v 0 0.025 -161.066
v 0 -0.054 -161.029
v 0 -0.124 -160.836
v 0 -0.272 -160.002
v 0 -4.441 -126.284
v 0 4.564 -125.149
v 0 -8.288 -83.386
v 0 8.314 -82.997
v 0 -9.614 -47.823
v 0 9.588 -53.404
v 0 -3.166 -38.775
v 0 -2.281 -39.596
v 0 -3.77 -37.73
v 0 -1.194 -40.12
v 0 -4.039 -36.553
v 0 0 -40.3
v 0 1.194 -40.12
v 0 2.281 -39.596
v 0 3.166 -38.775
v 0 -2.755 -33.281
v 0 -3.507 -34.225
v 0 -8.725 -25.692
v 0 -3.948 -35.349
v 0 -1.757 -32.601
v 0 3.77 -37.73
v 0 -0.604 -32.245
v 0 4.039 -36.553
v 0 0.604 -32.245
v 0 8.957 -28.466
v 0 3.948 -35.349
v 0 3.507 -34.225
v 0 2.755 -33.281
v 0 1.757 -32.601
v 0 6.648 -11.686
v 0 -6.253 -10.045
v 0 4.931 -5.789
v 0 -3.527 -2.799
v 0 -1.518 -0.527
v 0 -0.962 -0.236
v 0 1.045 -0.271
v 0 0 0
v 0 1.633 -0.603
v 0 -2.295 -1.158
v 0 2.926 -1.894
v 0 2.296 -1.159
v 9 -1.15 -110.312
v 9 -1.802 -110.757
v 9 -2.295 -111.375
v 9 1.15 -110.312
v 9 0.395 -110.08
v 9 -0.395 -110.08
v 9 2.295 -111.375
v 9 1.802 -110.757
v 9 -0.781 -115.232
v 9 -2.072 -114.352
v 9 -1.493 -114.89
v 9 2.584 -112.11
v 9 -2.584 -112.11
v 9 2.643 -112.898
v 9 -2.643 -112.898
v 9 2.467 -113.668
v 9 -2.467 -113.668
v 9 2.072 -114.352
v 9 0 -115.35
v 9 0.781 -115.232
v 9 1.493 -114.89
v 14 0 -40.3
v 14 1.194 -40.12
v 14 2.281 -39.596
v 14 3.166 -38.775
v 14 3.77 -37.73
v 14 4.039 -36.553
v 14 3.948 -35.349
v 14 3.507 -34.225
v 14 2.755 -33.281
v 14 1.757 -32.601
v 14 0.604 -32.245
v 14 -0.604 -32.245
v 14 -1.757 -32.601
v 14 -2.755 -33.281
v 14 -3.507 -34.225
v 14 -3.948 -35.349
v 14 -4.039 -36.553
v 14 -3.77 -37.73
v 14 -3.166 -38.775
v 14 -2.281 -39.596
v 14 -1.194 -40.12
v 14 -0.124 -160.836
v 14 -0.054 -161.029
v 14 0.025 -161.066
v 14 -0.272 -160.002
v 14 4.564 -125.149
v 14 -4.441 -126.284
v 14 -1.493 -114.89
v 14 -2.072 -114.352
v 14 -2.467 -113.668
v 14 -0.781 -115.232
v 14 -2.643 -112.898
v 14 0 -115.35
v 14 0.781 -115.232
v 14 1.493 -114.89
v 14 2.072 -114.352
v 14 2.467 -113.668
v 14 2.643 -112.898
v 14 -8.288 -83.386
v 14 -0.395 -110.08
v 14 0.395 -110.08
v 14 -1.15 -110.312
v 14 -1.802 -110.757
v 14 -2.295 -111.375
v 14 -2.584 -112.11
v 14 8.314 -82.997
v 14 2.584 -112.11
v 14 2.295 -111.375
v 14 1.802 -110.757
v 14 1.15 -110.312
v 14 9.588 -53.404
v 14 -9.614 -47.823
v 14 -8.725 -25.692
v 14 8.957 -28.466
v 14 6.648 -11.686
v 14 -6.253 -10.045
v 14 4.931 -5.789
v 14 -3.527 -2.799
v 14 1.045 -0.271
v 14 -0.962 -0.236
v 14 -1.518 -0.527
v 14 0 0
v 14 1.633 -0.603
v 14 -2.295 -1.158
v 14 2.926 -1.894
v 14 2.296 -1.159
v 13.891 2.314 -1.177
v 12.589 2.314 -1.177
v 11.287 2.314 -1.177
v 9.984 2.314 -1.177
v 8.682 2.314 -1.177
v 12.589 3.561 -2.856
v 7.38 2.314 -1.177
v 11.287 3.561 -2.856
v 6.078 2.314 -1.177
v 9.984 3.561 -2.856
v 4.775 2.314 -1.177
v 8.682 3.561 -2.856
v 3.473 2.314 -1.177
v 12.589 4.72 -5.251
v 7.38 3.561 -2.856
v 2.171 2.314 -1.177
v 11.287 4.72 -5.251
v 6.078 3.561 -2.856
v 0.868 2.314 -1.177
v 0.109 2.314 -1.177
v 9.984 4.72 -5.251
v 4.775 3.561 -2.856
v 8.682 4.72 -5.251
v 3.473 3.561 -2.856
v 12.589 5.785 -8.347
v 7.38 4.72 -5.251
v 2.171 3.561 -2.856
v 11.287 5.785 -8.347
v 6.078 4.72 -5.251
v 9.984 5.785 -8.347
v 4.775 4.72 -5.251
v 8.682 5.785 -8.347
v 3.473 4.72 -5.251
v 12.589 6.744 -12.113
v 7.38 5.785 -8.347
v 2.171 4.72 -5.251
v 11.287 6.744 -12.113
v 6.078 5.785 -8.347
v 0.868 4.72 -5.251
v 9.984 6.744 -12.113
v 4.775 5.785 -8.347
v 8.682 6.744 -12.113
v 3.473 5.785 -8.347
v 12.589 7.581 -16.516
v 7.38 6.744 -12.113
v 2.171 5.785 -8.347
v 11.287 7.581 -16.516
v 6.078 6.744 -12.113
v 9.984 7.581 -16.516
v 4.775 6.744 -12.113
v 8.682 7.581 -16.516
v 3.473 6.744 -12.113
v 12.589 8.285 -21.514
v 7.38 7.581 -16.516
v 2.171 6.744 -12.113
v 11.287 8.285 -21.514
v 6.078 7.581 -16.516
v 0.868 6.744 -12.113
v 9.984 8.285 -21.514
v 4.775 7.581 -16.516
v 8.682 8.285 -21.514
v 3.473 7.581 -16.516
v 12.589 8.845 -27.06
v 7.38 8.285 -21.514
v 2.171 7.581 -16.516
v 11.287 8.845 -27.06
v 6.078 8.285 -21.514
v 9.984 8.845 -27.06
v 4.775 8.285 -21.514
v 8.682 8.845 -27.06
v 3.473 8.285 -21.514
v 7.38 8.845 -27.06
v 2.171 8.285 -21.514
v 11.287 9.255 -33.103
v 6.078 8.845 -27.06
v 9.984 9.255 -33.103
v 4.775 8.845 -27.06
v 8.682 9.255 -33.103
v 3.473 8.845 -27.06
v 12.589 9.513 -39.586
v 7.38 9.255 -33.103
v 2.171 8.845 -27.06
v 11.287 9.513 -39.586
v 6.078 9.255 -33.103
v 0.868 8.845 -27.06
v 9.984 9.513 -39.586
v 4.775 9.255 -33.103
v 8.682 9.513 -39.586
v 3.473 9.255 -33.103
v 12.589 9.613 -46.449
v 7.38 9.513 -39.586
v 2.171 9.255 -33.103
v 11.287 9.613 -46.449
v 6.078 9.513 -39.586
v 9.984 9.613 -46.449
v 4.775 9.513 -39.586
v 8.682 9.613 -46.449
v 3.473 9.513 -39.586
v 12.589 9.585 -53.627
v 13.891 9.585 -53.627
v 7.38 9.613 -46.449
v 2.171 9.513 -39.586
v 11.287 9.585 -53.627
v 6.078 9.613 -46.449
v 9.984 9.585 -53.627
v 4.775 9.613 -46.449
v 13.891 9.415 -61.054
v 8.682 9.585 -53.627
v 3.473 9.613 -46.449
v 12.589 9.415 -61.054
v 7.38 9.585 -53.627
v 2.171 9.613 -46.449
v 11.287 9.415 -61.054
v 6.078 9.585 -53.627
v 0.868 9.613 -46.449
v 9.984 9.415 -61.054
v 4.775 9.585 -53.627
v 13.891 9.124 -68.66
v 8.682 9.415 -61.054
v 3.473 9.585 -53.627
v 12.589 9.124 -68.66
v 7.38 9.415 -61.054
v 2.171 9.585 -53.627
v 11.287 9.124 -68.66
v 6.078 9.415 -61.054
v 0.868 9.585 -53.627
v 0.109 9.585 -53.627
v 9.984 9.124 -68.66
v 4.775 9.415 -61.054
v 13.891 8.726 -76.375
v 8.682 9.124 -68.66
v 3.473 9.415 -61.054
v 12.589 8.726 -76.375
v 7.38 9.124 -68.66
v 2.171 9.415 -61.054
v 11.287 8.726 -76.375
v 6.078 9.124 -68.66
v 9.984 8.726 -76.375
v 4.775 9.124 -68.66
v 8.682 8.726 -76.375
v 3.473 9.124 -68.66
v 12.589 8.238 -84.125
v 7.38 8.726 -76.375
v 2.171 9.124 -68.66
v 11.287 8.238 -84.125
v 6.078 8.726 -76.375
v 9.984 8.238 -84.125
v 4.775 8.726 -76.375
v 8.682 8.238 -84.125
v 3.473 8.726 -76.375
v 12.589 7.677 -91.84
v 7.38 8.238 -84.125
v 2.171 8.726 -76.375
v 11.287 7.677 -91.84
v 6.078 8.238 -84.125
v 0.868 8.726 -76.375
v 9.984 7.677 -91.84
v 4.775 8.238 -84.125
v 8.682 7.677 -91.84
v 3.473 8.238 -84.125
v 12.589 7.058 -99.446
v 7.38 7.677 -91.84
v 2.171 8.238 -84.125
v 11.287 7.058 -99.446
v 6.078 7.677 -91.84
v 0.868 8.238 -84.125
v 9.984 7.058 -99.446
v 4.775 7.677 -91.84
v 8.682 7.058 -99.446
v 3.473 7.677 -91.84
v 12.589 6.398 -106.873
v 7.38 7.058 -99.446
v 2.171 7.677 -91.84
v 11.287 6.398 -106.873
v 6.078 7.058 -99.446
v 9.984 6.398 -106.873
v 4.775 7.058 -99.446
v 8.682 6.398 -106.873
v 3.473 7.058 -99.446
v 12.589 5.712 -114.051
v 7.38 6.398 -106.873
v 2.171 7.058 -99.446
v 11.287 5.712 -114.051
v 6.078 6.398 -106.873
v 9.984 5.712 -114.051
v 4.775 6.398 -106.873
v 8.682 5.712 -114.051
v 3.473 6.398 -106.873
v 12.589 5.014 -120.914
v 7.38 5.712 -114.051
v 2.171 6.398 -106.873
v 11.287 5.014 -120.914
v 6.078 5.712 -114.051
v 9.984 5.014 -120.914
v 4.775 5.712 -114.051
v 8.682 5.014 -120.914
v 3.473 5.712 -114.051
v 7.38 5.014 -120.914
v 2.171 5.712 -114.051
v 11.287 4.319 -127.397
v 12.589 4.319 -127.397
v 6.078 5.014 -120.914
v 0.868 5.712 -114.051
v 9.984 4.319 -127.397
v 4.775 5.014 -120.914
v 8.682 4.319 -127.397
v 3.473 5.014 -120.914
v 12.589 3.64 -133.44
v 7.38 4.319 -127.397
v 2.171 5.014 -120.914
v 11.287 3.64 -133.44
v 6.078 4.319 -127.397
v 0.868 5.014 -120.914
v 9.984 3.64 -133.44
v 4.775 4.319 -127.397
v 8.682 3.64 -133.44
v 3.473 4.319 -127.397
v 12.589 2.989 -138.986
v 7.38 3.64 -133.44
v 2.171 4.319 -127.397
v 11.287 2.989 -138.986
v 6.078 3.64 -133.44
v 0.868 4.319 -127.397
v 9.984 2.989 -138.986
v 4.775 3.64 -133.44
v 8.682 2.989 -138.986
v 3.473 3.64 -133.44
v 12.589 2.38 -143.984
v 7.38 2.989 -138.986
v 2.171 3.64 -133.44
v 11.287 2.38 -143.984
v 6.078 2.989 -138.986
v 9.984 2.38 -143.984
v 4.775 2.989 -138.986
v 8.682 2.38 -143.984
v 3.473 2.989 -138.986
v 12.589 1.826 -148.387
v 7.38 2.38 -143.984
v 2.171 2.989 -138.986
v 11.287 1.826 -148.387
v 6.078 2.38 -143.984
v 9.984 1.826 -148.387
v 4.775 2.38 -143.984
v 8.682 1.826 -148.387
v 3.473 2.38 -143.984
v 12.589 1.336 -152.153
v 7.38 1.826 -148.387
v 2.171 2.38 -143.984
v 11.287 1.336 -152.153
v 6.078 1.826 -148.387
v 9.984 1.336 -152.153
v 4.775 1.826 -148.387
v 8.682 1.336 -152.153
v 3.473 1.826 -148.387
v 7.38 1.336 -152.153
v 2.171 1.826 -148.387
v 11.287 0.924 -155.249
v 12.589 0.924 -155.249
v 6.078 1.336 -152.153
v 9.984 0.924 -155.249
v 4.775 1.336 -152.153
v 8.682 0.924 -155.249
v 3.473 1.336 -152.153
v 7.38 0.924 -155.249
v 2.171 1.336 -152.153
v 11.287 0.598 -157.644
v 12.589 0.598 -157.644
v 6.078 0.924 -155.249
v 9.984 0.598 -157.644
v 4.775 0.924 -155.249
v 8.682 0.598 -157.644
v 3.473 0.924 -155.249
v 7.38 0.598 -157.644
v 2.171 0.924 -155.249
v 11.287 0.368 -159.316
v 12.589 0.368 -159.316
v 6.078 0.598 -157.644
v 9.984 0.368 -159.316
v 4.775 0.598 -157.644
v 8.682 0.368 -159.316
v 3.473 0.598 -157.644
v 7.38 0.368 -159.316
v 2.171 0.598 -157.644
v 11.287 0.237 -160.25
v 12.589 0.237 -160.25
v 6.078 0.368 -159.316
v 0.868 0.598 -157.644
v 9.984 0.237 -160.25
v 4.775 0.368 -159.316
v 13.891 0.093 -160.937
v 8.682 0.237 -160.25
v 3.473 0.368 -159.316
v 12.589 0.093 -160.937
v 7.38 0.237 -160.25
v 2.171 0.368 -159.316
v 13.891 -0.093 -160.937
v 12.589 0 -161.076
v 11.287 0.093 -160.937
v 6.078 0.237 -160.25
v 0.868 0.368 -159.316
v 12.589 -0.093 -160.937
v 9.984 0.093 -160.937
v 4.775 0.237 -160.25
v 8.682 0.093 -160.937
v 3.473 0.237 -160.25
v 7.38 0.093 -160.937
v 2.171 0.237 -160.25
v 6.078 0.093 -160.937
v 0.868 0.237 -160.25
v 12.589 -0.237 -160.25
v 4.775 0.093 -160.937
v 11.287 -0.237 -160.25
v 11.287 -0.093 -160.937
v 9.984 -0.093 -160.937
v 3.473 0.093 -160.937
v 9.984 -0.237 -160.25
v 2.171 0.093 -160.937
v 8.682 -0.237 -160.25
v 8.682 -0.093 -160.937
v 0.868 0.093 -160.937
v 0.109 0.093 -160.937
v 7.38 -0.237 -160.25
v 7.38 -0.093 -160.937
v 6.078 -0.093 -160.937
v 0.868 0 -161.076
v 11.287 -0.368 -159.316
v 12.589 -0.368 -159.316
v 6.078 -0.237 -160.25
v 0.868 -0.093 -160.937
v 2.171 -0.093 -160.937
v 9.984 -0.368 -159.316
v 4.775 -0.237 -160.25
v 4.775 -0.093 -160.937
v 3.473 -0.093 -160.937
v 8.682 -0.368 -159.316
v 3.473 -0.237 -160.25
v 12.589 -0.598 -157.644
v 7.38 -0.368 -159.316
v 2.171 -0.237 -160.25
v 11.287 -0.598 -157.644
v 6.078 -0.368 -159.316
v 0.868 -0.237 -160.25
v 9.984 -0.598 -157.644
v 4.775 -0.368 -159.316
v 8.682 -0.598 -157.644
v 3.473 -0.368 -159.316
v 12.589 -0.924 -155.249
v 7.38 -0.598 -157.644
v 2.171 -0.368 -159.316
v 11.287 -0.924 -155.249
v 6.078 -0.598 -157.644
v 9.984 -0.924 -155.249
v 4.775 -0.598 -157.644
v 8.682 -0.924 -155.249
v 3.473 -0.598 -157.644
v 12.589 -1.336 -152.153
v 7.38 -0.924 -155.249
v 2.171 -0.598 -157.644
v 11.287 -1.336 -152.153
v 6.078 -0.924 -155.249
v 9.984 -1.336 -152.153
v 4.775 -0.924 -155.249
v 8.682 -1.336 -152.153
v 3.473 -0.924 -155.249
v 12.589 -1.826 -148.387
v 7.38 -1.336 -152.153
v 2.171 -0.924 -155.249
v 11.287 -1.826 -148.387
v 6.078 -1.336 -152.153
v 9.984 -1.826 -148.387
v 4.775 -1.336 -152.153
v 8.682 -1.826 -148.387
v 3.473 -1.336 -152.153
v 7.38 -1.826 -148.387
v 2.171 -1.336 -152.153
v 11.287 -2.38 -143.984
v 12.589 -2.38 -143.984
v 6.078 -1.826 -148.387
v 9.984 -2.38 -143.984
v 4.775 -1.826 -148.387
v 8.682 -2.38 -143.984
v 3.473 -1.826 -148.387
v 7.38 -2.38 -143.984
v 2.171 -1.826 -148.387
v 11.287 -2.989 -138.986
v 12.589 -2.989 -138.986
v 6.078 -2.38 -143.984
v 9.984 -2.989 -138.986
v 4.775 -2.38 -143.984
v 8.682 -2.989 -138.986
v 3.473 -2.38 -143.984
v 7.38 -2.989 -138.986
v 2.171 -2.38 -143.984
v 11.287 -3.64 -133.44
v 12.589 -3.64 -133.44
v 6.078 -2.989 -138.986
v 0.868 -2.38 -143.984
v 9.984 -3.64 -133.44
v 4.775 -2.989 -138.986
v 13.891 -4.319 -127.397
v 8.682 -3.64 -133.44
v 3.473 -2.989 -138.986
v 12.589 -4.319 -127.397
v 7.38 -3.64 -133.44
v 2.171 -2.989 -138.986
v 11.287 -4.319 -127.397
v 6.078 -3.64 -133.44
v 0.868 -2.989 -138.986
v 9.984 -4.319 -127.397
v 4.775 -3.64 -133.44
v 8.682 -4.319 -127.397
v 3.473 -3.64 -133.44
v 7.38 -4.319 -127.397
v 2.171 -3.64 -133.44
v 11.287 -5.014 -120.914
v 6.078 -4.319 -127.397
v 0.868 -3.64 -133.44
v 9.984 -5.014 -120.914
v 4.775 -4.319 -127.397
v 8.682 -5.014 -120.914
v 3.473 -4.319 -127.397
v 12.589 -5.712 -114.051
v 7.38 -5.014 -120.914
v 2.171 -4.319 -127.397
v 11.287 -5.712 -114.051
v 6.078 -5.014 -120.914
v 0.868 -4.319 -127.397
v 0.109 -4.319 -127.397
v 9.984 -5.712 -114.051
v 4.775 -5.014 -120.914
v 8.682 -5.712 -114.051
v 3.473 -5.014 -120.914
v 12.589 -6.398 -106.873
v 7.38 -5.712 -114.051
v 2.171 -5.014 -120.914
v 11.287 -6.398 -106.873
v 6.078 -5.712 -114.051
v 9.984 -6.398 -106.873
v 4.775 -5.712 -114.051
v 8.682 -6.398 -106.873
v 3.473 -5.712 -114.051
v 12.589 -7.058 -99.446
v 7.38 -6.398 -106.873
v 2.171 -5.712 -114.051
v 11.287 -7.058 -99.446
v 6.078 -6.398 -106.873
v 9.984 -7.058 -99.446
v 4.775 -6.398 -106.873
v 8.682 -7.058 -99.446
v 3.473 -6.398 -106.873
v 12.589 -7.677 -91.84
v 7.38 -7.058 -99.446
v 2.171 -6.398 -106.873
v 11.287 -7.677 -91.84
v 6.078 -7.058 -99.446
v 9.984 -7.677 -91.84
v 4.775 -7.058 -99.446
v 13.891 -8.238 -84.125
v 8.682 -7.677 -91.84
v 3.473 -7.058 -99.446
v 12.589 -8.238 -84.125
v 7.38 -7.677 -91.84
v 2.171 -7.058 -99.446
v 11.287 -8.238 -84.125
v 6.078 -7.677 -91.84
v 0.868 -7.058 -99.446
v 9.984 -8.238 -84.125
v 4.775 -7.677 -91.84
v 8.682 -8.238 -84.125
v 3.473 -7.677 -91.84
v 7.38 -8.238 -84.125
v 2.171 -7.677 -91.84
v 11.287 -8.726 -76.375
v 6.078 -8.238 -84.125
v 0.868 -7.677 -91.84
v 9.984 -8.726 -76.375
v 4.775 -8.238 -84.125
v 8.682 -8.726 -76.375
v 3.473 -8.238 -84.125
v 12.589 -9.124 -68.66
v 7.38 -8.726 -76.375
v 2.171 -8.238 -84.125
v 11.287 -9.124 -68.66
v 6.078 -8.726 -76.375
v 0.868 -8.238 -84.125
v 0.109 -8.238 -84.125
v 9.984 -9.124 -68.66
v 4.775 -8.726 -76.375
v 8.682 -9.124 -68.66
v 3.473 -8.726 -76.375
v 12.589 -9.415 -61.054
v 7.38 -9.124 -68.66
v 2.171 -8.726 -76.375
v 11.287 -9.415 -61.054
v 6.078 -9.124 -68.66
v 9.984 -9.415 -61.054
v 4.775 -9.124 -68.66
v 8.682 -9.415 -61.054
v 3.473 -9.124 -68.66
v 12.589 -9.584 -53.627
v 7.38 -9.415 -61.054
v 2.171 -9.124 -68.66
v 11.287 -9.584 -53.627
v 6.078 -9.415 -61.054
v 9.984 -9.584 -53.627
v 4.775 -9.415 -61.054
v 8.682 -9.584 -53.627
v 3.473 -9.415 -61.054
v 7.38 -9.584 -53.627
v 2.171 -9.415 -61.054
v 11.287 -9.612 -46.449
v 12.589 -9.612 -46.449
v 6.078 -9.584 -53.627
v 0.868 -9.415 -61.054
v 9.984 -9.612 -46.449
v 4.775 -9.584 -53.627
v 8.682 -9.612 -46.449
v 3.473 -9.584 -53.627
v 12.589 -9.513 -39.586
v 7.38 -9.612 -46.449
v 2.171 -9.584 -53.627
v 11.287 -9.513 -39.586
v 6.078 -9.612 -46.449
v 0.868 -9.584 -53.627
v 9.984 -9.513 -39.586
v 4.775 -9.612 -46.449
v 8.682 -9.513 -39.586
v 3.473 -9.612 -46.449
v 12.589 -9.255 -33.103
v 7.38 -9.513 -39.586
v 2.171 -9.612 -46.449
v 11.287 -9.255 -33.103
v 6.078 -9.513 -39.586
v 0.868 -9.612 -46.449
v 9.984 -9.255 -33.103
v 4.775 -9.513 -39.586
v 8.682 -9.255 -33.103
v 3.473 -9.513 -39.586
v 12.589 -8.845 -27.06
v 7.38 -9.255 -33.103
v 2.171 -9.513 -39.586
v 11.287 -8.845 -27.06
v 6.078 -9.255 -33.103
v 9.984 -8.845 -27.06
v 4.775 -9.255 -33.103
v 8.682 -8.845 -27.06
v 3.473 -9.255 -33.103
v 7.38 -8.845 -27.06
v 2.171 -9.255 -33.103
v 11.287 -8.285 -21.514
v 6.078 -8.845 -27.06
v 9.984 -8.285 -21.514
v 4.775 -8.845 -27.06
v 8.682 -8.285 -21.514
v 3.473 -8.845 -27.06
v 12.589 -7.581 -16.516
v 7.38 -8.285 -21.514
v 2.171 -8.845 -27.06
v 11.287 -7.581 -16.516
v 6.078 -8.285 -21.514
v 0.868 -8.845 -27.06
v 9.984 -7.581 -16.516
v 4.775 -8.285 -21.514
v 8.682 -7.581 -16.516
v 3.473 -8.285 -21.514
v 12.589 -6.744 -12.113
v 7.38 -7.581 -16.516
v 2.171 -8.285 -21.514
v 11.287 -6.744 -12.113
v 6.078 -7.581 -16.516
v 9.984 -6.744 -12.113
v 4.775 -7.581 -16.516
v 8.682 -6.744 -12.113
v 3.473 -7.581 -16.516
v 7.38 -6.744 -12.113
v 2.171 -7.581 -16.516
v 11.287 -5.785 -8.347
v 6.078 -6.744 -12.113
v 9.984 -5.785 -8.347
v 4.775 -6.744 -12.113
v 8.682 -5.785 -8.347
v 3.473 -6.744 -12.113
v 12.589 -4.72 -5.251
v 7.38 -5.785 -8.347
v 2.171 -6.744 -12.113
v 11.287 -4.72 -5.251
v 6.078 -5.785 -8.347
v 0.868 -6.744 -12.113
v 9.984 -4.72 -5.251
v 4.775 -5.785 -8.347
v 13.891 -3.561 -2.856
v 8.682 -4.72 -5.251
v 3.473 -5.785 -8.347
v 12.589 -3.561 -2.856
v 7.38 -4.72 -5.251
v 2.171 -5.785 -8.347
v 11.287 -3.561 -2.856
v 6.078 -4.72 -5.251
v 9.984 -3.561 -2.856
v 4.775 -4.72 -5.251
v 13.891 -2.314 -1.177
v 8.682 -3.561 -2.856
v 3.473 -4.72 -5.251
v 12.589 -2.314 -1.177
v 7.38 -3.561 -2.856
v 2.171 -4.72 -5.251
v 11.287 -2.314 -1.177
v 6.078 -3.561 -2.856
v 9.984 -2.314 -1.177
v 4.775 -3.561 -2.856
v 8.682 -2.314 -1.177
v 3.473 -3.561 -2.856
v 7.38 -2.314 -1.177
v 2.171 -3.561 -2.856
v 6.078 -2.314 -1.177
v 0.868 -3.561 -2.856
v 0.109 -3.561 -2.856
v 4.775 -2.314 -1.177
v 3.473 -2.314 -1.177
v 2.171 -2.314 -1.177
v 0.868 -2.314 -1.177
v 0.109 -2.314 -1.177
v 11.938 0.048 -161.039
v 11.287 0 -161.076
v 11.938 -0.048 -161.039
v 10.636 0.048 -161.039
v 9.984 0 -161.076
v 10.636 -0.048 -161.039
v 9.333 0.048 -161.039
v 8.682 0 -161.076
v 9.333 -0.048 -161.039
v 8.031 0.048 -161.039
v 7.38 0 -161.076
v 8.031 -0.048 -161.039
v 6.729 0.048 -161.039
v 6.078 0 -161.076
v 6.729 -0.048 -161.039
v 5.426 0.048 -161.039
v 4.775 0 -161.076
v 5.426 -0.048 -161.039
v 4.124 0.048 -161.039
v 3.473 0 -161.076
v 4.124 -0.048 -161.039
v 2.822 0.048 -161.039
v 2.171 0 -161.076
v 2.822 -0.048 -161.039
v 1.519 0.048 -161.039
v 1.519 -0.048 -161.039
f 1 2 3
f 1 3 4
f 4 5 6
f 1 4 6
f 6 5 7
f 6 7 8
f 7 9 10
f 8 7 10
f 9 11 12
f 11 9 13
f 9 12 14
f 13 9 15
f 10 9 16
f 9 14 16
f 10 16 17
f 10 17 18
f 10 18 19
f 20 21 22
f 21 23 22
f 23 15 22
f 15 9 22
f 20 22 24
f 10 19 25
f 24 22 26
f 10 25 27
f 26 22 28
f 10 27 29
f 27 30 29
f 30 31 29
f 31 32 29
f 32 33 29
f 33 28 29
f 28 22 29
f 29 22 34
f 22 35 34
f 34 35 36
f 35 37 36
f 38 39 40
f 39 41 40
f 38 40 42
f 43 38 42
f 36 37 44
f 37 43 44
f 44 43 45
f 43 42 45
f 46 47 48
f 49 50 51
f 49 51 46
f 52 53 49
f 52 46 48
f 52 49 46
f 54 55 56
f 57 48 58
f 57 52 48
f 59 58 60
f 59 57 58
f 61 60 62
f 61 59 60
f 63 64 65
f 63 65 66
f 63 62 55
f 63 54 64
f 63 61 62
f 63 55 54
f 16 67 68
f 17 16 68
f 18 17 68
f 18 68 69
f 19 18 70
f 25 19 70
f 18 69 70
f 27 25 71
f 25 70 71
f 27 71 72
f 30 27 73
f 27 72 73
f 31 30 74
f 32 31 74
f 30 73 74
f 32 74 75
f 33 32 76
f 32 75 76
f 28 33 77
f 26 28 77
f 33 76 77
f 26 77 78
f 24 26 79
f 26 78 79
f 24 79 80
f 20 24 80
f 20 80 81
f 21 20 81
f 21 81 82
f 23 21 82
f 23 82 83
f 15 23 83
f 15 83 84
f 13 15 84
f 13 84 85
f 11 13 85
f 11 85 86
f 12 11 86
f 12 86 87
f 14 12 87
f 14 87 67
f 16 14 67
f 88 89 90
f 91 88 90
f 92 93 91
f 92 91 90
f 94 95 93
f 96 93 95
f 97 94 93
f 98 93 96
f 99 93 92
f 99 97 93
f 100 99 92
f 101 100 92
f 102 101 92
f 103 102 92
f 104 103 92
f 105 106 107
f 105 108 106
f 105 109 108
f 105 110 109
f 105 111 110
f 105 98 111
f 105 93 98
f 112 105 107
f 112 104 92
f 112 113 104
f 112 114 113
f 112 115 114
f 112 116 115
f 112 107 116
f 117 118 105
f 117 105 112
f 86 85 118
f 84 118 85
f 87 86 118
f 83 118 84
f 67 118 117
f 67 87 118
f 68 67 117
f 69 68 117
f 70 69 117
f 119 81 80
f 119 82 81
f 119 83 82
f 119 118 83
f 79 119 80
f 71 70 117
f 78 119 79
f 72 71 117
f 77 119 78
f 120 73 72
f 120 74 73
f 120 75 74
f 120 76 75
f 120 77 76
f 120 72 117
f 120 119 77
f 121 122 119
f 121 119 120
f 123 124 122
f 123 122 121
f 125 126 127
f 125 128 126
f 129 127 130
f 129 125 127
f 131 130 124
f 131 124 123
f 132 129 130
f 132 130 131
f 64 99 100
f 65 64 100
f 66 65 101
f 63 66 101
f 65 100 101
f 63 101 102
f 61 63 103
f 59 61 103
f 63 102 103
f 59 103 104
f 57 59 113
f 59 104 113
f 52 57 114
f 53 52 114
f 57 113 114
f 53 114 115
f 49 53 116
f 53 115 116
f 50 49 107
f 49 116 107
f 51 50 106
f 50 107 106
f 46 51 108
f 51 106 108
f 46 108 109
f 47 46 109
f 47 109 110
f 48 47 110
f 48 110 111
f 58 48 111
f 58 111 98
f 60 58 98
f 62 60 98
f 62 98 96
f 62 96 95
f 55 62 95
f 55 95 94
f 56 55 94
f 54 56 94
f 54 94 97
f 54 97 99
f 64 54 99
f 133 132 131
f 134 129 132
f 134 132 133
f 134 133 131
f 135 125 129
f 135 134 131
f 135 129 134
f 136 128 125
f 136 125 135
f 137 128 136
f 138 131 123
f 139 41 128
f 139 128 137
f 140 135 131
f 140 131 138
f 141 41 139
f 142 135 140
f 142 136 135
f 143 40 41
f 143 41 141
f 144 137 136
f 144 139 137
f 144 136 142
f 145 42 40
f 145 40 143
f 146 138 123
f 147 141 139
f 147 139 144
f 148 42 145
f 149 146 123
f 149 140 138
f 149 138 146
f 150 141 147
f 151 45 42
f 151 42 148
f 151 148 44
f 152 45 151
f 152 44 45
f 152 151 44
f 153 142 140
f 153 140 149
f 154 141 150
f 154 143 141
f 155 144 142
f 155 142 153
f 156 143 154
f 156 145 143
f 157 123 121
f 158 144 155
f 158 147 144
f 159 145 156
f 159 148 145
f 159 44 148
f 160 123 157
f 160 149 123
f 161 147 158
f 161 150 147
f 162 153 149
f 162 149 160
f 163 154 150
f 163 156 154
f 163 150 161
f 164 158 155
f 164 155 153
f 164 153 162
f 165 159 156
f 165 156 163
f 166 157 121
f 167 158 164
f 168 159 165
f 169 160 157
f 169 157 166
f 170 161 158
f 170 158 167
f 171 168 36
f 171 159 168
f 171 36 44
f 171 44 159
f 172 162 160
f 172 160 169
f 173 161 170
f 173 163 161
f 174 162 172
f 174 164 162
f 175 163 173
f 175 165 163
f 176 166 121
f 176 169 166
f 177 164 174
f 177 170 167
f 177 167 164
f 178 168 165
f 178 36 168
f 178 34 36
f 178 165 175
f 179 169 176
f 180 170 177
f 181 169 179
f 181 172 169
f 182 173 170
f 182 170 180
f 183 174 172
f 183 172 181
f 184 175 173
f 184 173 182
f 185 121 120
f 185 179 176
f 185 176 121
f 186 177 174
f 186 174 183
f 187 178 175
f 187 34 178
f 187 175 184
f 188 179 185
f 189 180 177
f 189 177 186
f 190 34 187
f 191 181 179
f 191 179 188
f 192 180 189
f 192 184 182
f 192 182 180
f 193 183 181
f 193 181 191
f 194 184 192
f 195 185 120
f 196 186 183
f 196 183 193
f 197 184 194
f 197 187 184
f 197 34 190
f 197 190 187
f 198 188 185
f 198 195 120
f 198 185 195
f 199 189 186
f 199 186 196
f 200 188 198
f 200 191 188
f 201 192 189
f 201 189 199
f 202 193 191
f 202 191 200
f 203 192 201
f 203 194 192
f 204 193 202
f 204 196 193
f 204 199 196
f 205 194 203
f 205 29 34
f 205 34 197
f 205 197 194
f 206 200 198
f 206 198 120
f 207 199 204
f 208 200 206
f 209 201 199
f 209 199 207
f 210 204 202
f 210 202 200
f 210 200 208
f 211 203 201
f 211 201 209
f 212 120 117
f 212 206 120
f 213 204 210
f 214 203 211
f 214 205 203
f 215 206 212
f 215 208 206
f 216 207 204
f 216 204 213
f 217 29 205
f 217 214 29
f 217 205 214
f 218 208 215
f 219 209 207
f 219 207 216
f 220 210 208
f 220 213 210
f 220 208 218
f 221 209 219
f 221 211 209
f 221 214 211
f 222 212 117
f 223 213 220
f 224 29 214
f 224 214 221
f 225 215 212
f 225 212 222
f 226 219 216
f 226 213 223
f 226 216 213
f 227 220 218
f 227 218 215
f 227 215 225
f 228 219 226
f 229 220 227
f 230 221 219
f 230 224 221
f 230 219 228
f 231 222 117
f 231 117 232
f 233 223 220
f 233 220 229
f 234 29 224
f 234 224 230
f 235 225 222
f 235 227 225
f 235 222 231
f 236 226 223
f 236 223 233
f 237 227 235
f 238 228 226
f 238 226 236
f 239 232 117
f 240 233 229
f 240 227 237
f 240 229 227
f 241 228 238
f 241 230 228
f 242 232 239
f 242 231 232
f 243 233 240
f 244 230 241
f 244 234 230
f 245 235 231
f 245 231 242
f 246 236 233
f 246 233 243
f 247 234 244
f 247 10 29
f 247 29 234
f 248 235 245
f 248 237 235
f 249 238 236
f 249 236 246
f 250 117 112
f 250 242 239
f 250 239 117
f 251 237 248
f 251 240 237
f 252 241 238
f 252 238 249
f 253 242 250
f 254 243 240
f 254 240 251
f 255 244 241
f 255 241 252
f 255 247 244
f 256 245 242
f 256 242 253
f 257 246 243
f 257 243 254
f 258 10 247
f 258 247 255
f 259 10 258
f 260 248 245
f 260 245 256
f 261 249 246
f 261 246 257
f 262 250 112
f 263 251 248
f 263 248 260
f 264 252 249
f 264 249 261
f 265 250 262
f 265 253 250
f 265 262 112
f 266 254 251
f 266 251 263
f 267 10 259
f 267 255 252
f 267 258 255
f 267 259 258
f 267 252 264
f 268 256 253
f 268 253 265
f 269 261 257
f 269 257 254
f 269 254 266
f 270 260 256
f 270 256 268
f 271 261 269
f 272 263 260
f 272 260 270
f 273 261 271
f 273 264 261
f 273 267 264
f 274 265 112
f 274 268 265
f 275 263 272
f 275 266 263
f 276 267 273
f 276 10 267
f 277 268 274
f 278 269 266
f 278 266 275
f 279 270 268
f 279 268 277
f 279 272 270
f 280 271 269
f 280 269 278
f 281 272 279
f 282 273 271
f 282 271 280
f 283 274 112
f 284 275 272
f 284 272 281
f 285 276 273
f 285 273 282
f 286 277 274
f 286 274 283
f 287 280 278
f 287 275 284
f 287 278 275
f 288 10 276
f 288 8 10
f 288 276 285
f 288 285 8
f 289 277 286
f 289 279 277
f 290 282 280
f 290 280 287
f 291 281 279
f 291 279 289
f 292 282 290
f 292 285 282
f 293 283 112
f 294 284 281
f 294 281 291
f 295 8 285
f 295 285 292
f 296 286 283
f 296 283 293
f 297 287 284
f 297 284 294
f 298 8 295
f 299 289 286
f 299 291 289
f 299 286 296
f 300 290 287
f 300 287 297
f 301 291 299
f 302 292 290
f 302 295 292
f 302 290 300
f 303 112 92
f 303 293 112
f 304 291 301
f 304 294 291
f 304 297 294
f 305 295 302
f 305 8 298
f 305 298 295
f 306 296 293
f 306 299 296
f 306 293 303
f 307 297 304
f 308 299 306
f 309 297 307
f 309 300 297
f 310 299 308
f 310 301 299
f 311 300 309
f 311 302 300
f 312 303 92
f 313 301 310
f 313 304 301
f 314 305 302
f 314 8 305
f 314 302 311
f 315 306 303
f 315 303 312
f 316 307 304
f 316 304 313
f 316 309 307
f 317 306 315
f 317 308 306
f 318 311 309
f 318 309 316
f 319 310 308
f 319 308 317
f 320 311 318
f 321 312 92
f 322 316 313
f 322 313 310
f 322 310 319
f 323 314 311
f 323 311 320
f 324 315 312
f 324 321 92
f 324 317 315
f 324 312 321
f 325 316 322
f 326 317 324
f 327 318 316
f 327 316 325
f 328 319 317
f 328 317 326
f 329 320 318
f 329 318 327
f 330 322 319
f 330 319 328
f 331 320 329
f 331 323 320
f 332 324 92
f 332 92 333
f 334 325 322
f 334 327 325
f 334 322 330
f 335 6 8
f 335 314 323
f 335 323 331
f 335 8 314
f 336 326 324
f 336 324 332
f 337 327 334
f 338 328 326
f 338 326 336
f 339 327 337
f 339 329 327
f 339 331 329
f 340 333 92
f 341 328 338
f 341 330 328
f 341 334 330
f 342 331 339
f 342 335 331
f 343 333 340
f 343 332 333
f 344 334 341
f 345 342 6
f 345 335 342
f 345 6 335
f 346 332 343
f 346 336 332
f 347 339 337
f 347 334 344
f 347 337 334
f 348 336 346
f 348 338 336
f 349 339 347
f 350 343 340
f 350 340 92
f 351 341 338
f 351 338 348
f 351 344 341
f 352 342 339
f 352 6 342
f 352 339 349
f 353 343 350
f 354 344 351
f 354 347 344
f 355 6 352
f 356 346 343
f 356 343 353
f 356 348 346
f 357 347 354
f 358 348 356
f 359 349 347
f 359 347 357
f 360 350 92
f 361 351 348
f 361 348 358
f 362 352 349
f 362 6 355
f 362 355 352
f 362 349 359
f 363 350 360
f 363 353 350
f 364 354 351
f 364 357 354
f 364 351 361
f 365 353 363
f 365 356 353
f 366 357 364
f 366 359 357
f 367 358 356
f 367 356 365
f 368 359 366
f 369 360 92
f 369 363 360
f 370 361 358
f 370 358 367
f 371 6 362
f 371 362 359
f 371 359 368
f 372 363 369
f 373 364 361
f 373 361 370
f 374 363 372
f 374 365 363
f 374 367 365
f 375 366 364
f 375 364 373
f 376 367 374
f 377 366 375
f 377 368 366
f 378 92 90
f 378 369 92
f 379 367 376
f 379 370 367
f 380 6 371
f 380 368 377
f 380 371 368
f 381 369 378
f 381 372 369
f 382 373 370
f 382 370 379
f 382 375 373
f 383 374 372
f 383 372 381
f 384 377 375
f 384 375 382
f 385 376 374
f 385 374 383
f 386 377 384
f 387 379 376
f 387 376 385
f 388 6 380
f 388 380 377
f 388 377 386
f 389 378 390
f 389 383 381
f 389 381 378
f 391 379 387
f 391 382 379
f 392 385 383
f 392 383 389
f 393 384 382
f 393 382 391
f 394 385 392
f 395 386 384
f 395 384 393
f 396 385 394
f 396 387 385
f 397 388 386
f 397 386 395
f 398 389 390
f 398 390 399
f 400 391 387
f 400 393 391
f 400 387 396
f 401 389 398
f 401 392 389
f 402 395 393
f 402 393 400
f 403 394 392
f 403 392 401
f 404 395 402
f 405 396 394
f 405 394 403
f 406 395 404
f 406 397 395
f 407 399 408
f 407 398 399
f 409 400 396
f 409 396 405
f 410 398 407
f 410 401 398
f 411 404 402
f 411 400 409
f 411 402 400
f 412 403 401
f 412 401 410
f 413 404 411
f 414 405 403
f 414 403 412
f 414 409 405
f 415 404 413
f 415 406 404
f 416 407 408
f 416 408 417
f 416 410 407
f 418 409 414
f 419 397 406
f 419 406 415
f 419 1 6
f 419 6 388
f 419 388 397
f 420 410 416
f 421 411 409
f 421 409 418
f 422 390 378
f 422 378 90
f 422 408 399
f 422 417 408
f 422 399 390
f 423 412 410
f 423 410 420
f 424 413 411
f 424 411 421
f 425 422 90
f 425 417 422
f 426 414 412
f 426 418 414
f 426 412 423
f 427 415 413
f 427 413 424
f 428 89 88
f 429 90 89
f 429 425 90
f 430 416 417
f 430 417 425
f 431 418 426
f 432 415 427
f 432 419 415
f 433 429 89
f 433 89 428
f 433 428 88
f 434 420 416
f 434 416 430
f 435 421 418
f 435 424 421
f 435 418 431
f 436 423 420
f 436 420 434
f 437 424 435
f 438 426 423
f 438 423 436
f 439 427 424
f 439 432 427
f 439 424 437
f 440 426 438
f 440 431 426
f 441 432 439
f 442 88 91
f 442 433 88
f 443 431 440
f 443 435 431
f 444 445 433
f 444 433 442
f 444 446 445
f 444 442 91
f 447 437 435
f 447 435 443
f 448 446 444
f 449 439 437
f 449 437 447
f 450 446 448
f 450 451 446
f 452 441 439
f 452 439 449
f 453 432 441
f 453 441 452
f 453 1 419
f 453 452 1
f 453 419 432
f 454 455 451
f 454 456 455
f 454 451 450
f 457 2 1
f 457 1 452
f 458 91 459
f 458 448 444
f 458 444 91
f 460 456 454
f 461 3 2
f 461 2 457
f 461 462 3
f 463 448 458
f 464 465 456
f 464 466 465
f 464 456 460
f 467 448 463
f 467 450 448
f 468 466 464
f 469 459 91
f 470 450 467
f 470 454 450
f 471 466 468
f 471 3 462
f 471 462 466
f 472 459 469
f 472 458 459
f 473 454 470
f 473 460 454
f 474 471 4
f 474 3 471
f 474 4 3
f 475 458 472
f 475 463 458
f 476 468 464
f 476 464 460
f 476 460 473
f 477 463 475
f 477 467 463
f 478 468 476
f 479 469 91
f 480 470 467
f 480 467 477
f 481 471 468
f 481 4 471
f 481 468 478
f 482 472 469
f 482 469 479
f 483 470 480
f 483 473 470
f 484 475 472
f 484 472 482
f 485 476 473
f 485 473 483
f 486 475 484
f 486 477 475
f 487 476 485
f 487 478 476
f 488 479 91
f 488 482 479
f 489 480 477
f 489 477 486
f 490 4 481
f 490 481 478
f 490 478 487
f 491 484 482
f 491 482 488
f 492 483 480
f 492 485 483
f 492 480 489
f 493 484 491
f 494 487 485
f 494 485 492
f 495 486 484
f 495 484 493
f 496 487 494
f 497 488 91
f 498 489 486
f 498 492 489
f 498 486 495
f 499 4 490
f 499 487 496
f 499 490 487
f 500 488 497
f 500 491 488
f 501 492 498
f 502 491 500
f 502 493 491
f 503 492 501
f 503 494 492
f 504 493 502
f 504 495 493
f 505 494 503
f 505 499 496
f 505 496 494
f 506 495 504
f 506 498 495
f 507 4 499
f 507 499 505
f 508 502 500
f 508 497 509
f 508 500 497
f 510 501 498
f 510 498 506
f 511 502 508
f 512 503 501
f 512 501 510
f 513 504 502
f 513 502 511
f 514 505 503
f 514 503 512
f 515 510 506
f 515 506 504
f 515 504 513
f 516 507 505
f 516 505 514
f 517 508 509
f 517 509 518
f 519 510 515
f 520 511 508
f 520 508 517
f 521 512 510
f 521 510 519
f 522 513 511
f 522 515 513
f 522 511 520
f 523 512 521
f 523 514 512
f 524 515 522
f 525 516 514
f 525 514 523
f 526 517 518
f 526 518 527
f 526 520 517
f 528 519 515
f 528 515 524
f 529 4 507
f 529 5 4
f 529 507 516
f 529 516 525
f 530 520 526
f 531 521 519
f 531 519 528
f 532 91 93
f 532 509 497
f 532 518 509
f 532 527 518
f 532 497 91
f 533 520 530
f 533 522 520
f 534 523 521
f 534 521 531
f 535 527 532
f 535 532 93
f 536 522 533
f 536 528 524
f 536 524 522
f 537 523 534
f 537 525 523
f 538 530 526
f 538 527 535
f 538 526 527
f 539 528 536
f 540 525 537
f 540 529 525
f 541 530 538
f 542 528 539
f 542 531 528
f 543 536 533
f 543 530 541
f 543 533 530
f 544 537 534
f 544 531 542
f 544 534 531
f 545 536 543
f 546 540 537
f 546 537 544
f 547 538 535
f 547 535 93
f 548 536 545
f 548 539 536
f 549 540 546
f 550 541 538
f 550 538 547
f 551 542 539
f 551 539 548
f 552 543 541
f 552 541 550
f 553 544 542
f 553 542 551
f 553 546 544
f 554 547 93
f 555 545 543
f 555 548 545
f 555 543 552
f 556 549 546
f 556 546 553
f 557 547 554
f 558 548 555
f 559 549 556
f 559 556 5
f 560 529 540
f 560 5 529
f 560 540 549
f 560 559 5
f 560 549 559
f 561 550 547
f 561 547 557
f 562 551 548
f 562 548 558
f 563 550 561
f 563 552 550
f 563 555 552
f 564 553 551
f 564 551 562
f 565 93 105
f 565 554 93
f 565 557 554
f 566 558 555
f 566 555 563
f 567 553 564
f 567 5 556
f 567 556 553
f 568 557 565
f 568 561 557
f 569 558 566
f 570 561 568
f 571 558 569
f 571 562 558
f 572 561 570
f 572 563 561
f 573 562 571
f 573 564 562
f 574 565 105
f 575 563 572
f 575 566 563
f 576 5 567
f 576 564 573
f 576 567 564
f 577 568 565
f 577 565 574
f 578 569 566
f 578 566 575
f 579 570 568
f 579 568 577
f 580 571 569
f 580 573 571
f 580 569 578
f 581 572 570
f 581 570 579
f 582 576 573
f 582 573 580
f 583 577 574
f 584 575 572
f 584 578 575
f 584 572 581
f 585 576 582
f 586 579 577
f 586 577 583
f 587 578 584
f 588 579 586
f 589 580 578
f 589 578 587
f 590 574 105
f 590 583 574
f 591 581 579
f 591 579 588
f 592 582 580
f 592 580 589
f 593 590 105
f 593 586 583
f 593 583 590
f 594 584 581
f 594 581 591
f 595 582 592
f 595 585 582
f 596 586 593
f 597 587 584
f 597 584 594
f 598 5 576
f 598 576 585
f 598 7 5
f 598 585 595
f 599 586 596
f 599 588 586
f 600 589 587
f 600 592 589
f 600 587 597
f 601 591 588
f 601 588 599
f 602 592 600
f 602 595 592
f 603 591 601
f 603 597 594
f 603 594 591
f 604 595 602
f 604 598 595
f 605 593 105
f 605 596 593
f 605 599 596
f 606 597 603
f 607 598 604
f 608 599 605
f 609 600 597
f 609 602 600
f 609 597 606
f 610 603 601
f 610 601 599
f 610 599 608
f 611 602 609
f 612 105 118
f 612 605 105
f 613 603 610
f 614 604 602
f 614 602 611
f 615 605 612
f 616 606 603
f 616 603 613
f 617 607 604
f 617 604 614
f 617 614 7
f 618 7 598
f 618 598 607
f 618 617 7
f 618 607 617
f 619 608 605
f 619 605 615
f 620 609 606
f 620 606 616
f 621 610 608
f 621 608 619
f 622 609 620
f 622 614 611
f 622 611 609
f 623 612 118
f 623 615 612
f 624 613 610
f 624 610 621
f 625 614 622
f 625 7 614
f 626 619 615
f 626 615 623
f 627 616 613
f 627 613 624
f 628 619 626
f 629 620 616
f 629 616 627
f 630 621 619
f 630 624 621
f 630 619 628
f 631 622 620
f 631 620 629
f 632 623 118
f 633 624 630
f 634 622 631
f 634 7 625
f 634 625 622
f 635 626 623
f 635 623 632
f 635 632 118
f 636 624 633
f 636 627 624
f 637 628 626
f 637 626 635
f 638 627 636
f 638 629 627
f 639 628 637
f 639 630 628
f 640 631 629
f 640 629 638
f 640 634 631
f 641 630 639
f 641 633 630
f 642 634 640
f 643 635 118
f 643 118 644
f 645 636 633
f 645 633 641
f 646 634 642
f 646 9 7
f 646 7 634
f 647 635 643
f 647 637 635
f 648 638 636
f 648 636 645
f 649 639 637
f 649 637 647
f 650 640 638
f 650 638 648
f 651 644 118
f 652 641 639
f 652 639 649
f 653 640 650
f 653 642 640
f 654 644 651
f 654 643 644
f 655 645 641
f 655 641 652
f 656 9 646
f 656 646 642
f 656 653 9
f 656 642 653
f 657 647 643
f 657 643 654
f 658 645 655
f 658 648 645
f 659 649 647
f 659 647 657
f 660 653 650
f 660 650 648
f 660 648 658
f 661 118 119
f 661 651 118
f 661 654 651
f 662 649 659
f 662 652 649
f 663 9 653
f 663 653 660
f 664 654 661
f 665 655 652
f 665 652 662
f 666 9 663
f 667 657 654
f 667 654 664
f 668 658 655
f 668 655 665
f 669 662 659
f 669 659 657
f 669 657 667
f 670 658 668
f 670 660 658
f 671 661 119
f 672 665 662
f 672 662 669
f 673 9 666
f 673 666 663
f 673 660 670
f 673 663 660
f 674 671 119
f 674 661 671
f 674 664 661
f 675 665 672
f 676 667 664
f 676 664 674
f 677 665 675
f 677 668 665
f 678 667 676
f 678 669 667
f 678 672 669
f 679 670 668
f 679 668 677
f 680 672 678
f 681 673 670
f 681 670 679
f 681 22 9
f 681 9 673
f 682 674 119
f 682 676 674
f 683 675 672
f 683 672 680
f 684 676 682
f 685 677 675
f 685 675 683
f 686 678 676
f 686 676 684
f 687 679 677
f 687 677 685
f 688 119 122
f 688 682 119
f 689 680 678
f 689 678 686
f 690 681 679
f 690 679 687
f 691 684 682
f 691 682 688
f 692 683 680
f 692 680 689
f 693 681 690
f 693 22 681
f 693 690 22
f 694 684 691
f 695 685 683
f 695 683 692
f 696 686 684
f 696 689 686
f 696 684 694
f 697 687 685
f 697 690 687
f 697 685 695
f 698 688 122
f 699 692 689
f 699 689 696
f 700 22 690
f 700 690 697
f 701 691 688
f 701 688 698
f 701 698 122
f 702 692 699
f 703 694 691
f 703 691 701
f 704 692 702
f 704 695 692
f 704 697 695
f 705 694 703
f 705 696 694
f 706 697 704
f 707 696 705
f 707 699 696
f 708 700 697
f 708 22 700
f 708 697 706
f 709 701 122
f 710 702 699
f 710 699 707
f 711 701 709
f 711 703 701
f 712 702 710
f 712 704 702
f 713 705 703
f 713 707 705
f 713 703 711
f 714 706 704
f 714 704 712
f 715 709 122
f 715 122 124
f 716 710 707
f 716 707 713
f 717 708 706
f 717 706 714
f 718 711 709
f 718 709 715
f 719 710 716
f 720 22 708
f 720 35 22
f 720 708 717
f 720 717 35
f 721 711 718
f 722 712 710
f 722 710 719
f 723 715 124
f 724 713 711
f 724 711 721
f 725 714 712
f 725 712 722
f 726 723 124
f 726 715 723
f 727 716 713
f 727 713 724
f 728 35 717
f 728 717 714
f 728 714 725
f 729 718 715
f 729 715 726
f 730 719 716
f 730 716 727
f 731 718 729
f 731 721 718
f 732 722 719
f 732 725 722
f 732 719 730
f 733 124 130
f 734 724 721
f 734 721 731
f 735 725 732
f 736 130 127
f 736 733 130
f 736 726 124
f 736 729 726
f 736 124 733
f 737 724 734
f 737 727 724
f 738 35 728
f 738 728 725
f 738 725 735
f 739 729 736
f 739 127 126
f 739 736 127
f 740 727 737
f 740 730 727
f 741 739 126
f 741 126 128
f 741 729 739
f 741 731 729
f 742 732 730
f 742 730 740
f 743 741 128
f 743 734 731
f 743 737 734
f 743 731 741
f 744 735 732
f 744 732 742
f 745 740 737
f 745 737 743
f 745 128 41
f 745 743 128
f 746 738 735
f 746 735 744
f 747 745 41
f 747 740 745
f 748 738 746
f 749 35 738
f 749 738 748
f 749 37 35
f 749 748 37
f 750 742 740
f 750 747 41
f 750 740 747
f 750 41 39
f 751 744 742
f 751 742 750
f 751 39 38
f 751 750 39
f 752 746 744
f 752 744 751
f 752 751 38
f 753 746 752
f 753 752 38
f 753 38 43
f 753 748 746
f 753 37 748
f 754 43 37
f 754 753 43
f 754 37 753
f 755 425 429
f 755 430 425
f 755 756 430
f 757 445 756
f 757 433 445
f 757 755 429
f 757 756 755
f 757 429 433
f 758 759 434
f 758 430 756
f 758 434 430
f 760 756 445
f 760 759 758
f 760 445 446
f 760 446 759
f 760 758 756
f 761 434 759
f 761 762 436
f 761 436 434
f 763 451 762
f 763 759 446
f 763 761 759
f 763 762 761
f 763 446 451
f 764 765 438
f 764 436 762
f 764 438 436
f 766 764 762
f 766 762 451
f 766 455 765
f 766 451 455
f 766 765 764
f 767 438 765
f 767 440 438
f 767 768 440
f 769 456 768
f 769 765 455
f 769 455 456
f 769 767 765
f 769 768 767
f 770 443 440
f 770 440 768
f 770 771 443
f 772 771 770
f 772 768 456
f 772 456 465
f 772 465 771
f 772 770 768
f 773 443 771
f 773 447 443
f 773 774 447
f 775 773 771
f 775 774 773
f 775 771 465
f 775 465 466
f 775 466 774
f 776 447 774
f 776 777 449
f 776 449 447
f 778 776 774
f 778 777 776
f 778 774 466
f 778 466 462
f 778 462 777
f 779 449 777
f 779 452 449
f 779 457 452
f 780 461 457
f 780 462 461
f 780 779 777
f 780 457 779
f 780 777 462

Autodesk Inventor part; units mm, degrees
ref_plane "YZ Plane" through (0, 0, 0) normal (1, 0, 0) x (0, 1, 0)
ref_plane "XZ Plane" through (0, 0, 0) normal (0, 1, 0) x (-1, 0, 0)
ref_plane "XY Plane" through (0, 0, 0) normal (0, 0, 1) x (1, 0, 0)
sketch "Sketch9" plane through (0, 0, 0) normal (1, 0, 0) x (0, 1, 0)
  line L0 (0, 0) -> (0.6838, -0.0937) construction
  line L1 (0.6838, -0.0937) -> (1.3528, -0.3746) construction
  line L2 (1.3528, -0.3746) -> (2.0064, -0.8421) construction
  line L3 (2.0064, -0.8421) -> (2.6435, -1.495) construction
  line L4 (2.6435, -1.495) -> (3.263, -2.3319) construction
  line L5 (3.263, -2.3319) -> (3.8633, -3.3508) construction
  line L6 (3.8633, -3.3508) -> (4.4431, -4.5492) construction
  line L7 (4.4431, -4.5492) -> (5.0005, -5.9245) construction
  line L8 (5.0005, -5.9245) -> (5.5339, -7.4733) construction
  line L9 (5.5339, -7.4733) -> (6.0414, -9.1922) construction
  line L10 (6.0414, -9.1922) -> (6.5213, -11.0769) construction
  line L11 (6.5213, -11.0769) -> (6.9717, -13.1233) construction
  line L12 (6.9717, -13.1233) -> (7.3908, -15.3264) construction
  line L13 (7.3908, -15.3264) -> (7.7773, -17.6811) construction
  line L14 (7.7773, -17.6811) -> (8.1295, -20.182) construction
  line L15 (8.1295, -20.182) -> (8.4463, -22.8232) construction
  line L16 (8.4463, -22.8232) -> (8.7266, -25.5985) construction
  line L17 (8.7266, -25.5985) -> (8.9696, -28.5014) construction
  line L18 (8.9696, -28.5014) -> (9.1748, -31.5252) construction
  line L19 (9.1748, -31.5252) -> (9.3419, -34.6628) construction
  line L20 (9.3419, -34.6628) -> (9.4708, -37.9069) construction
  line L21 (9.4708, -37.9069) -> (9.5619, -41.2498) construction
  line L22 (9.5619, -41.2498) -> (9.6156, -44.6839) construction
  line L23 (9.6156, -44.6839) -> (9.6156, -48.201) construction
  line L24 (9.6156, -48.201) -> (9.6156, -51.793) construction
  line L25 (9.6156, -51.793) -> (9.5617, -55.4514) construction
  line L26 (9.5617, -55.4514) -> (9.4762, -59.1677) construction
  line L27 (9.4762, -59.1677) -> (9.3595, -62.9333) construction
  line L28 (9.3595, -62.9333) -> (9.2132, -66.7394) construction
  line L29 (9.2132, -66.7394) -> (9.0394, -70.5769) construction
  line L30 (9.0394, -70.5769) -> (8.8398, -74.4371) construction
  line L31 (8.8398, -74.4371) -> (8.6167, -78.3109) construction
  line L32 (8.6167, -78.3109) -> (8.372, -82.1891) construction
  line L33 (8.372, -82.1891) -> (8.1078, -86.0629) construction
  line L34 (8.1078, -86.0629) -> (7.8263, -89.9231) construction
  line L35 (7.8263, -89.9231) -> (7.5294, -93.7607) construction
  line L36 (7.5294, -93.7607) -> (7.2193, -97.5667) construction
  line L37 (7.2193, -97.5667) -> (6.8979, -101.3323) construction
  line L38 (6.8979, -101.3323) -> (6.5672, -105.0486) construction
  line L39 (6.5672, -105.0486) -> (6.2291, -108.7071) construction
  line L40 (6.2291, -108.7071) -> (5.8855, -112.299) construction
  line L41 (5.8855, -112.299) -> (5.5382, -115.8161) construction
  line L42 (5.5382, -115.8161) -> (5.1889, -119.2502) construction
  line L43 (5.1889, -119.2502) -> (4.8393, -122.5931) construction
  line L44 (4.8393, -122.5931) -> (4.4912, -125.8372) construction
  line L45 (4.4912, -125.8372) -> (4.1463, -128.9748) construction
  line L46 (4.1463, -128.9748) -> (3.8061, -131.9986) construction
  line L47 (3.8061, -131.9986) -> (3.4724, -134.9015) construction
  line L48 (3.4724, -134.9015) -> (3.1466, -137.6768) construction
  line L49 (3.1466, -137.6768) -> (2.8305, -140.318) construction
  line L50 (2.8305, -140.318) -> (2.5255, -142.8189) construction
  line L51 (2.5255, -142.8189) -> (2.2332, -145.1736) construction
  line L52 (2.2332, -145.1736) -> (1.9553, -147.3767) construction
  line L53 (1.9553, -147.3767) -> (1.693, -149.4231) construction
  line L54 (1.693, -149.4231) -> (1.448, -151.3078) construction
  line L55 (1.448, -151.3078) -> (1.2215, -153.0267) construction
  line L56 (1.2215, -153.0267) -> (1.015, -154.5755) construction
  line L57 (1.015, -154.5755) -> (0.8295, -155.9508) construction
  line L58 (0.8295, -155.9508) -> (0.6664, -157.1492) construction
  line L59 (0.6664, -157.1492) -> (0.5265, -158.1681) construction
  line L60 (0.5265, -158.1681) -> (0.4108, -159.0049) construction
  line L61 (0.4108, -159.0049) -> (0.32, -159.6579) construction
  line L62 (0.32, -159.6579) -> (0.2547, -160.1254) construction
  line L63 (0.2547, -160.1254) -> (0.2154, -160.4063) construction
  line L64 (0.2154, -160.4063) -> (0.2022, -160.5) construction
  line L65 (0.2022, -160.5) -> (0, -161.463) construction
  line L66 (0, -161.463) -> (-0.2022, -160.5) construction
  line L67 (-0.2022, -160.5) -> (-0.2154, -160.4063) construction
  line L68 (-0.2154, -160.4063) -> (-0.2547, -160.1254) construction
  line L69 (-0.2547, -160.1254) -> (-0.32, -159.6579) construction
  line L70 (-0.32, -159.6579) -> (-0.4108, -159.0049) construction
  line L71 (-0.4108, -159.0049) -> (-0.5265, -158.1681) construction
  line L72 (-0.5265, -158.1681) -> (-0.6664, -157.1492) construction
  line L73 (-0.6664, -157.1492) -> (-0.8295, -155.9508) construction
  line L74 (-0.8295, -155.9508) -> (-1.015, -154.5755) construction
  line L75 (-1.015, -154.5755) -> (-1.2215, -153.0267) construction
  line L76 (-1.2215, -153.0267) -> (-1.448, -151.3078) construction
  line L77 (-1.448, -151.3078) -> (-1.693, -149.4231) construction
  line L78 (-1.693, -149.4231) -> (-1.9553, -147.3767) construction
  line L79 (-1.9553, -147.3767) -> (-2.2332, -145.1736) construction
  line L80 (-2.2332, -145.1736) -> (-2.5255, -142.8189) construction
  line L81 (-2.5255, -142.8189) -> (-2.8305, -140.318) construction
  line L82 (-2.8305, -140.318) -> (-3.1466, -137.6768) construction
  line L83 (-3.1466, -137.6768) -> (-3.4724, -134.9015) construction
  line L84 (-3.4724, -134.9015) -> (-3.8061, -131.9986) construction
  line L85 (-3.8061, -131.9986) -> (-4.1463, -128.9748) construction
  line L86 (-4.1463, -128.9748) -> (-4.4912, -125.8372) construction
  line L87 (-4.4912, -125.8372) -> (-4.8393, -122.5931) construction
  line L88 (-4.8393, -122.5931) -> (-5.1889, -119.2502) construction
  line L89 (-5.1889, -119.2502) -> (-5.5382, -115.8161) construction
  line L90 (-5.5382, -115.8161) -> (-5.8855, -112.299) construction
  line L91 (-5.8855, -112.299) -> (-6.2291, -108.7071) construction
  line L92 (-6.2291, -108.7071) -> (-6.5672, -105.0486) construction
  line L93 (-6.5672, -105.0486) -> (-6.8979, -101.3323) construction
  line L94 (-6.8979, -101.3323) -> (-7.2193, -97.5667) construction
  line L95 (-7.2193, -97.5667) -> (-7.5294, -93.7607) construction
  line L96 (-7.5294, -93.7607) -> (-7.8263, -89.9231) construction
  line L97 (-7.8263, -89.9231) -> (-8.1078, -86.0629) construction
  line L98 (-8.1078, -86.0629) -> (-8.372, -82.1891) construction
  line L99 (-8.372, -82.1891) -> (-8.6167, -78.3109) construction
  line L100 (-8.6167, -78.3109) -> (-8.8398, -74.4371) construction
  line L101 (-8.8398, -74.4371) -> (-9.0394, -70.5769) construction
  line L102 (-9.0394, -70.5769) -> (-9.2132, -66.7394) construction
  line L103 (-9.2132, -66.7394) -> (-9.3595, -62.9333) construction
  line L104 (-9.3595, -62.9333) -> (-9.4762, -59.1677) construction
  line L105 (-9.4762, -59.1677) -> (-9.5617, -55.4514) construction
  line L106 (-9.5617, -55.4514) -> (-9.6144, -51.793) construction
  line L107 (-9.6144, -51.793) -> (-9.6144, -48.201) construction
  line L108 (-9.6144, -48.201) -> (-9.6144, -44.6839) construction
  line L109 (-9.6144, -44.6839) -> (-9.5619, -41.2498) construction
  line L110 (-9.5619, -41.2498) -> (-9.4708, -37.9069) construction
  line L111 (-9.4708, -37.9069) -> (-9.3419, -34.6628) construction
  line L112 (-9.3419, -34.6628) -> (-9.1748, -31.5252) construction
  line L113 (-9.1748, -31.5252) -> (-8.9696, -28.5014) construction
  line L114 (-8.9696, -28.5014) -> (-8.7266, -25.5985) construction
  line L115 (-8.7266, -25.5985) -> (-8.4463, -22.8232) construction
  line L116 (-8.4463, -22.8232) -> (-8.1295, -20.182) construction
  line L117 (-8.1295, -20.182) -> (-7.7773, -17.6811) construction
  line L118 (-7.7773, -17.6811) -> (-7.3908, -15.3264) construction
  line L119 (-7.3908, -15.3264) -> (-6.9717, -13.1233) construction
  line L120 (-6.9717, -13.1233) -> (-6.5213, -11.0769) construction
  line L121 (-6.5213, -11.0769) -> (-6.0414, -9.1922) construction
  line L122 (-6.0414, -9.1922) -> (-5.5339, -7.4733) construction
  line L123 (-5.5339, -7.4733) -> (-5.0005, -5.9245) construction
  line L124 (-5.0005, -5.9245) -> (-4.4431, -4.5492) construction
  line L125 (-4.4431, -4.5492) -> (-3.8633, -3.3508) construction
  line L126 (-3.8633, -3.3508) -> (-3.263, -2.3319) construction
  line L127 (-3.263, -2.3319) -> (-2.6435, -1.495) construction
  line L128 (-2.6435, -1.495) -> (-2.0064, -0.8421) construction
  line L129 (-2.0064, -0.8421) -> (-1.3528, -0.3746) construction
  line L130 (-1.3528, -0.3746) -> (-0.6838, -0.0937) construction
  line L131 (-0.6838, -0.0937) -> (0, 0) construction
  spline S0 degree 4 poles (0, 0) (0.6838, -0.0937) (1.3528, -0.3746) (2.0064, -0.8421) (2.6435, -1.495) (3.263, -2.3319) (3.8633, -3.3508) (4.4431, -4.5492) (5.0005, -5.9245) (5.5339, -7.4733) (6.0414, -9.1922) (6.5213, -11.0769) (6.9717, -13.1233) (7.3908, -15.3264) (7.7773, -17.6811) (8.1295, -20.182) (8.4463, -22.8232) (8.7266, -25.5985) (8.9696, -28.5014) (9.1748, -31.5252) (9.3419, -34.6628) (9.4708, -37.9069) (9.5619, -41.2498) (9.6156, -44.6839) (9.6156, -48.201) (9.6156, -51.793) (9.5617, -55.4514) (9.4762, -59.1677) (9.3595, -62.9333) (9.2132, -66.7394) (9.0394, -70.5769) (8.8398, -74.4371) (8.6167, -78.3109) (8.372, -82.1891) (8.1078, -86.0629) (7.8263, -89.9231) (7.5294, -93.7607) (7.2193, -97.5667) (6.8979, -101.3323) (6.5672, -105.0486) (6.2291, -108.7071) (5.8855, -112.299) (5.5382, -115.8161) (5.1889, -119.2502) (4.8393, -122.5931) (4.4912, -125.8372) (4.1463, -128.9748) (3.8061, -131.9986) (3.4724, -134.9015) (3.1466, -137.6768) (2.8305, -140.318) (2.5255, -142.8189) (2.2332, -145.1736) (1.9553, -147.3767) (1.693, -149.4231) (1.448, -151.3078) (1.2215, -153.0267) (1.015, -154.5755) (0.8295, -155.9508) (0.6664, -157.1492) (0.5265, -158.1681) (0.4108, -159.0049) (0.32, -159.6579) (0.2547, -160.1254) (0.2154, -160.4063) (0.2022, -160.5) (0, -161.463) (-0.2022, -160.5) (-0.2154, -160.4063) (-0.2547, -160.1254) (-0.32, -159.6579) (-0.4108, -159.0049) (-0.5265, -158.1681) (-0.6664, -157.1492) (-0.8295, -155.9508) (-1.015, -154.5755) (-1.2215, -153.0267) (-1.448, -151.3078) (-1.693, -149.4231) (-1.9553, -147.3767) (-2.2332, -145.1736) (-2.5255, -142.8189) (-2.8305, -140.318) (-3.1466, -137.6768) (-3.4724, -134.9015) (-3.8061, -131.9986) (-4.1463, -128.9748) (-4.4912, -125.8372) (-4.8393, -122.5931) (-5.1889, -119.2502) (-5.5382, -115.8161) (-5.8855, -112.299) (-6.2291, -108.7071) (-6.5672, -105.0486) (-6.8979, -101.3323) (-7.2193, -97.5667) (-7.5294, -93.7607) (-7.8263, -89.9231) (-8.1078, -86.0629) (-8.372, -82.1891) (-8.6167, -78.3109) (-8.8398, -74.4371) (-9.0394, -70.5769) (-9.2132, -66.7394) (-9.3595, -62.9333) (-9.4762, -59.1677) (-9.5617, -55.4514) (-9.6144, -51.793) (-9.6144, -48.201) (-9.6144, -44.6839) (-9.5619, -41.2498) (-9.4708, -37.9069) (-9.3419, -34.6628) (-9.1748, -31.5252) (-8.9696, -28.5014) (-8.7266, -25.5985) (-8.4463, -22.8232) (-8.1295, -20.182) (-7.7773, -17.6811) (-7.3908, -15.3264) (-6.9717, -13.1233) (-6.5213, -11.0769) (-6.0414, -9.1922) (-5.5339, -7.4733) (-5.0005, -5.9245) (-4.4431, -4.5492) (-3.8633, -3.3508) (-3.263, -2.3319) (-2.6435, -1.495) (-2.0064, -0.8421) (-1.3528, -0.3746) (-0.6838, -0.0937) (0, 0) knots 1 1 1 1 1 2 3 4 5 6 7 8 9 10 11 12 13 14 15 16 17 18 19 20 21 22 23 24 25 26 27 28 29 30 31 32 33 34 35 36 37 38 39 40 41 42 43 44 45 46 47 48 49 50 51 52 53 54 55 56 57 58 59 60 61 62 63 64 65 66 67 68 69 70 71 72 73 74 75 76 77 78 79 80 81 82 83 84 85 86 87 88 89 90 91 92 93 94 95 96 97 98 99 100 101 102 103 104 105 106 107 108 109 110 111 112 113 114 115 116 117 118 119 120 121 122 123 124 125 126 127 128 129 130 130 130 130 130
extrude "Extrusion3" add sketch "Sketch9" along normal blind 14
sketch "Sketch10" plane through (14, 0, 0) normal (1, 0, 0) x (0, 0, -1)
  circle A0 centre (36.25, 0) radius 4.05
  point P0 (0, 0)
  dimension "d88" = 8.1
  dimension "d89" = 36.25
extrude "Extrusion4" cut sketch "Sketch10" against normal blind 15
sketch "Sketch11" plane through (14, 0, 0) normal (1, 0, 0) x (0, 0, -1)
  circle A0 centre (112.7, 0) radius 2.65
  point P0 (0, 0)
  dimension "d93" = 5.3
  dimension "d94" = 112.7
extrude "Extrusion5" cut sketch "Sketch11" against normal blind 5
properties part number "6P-009" material "Poplar"
